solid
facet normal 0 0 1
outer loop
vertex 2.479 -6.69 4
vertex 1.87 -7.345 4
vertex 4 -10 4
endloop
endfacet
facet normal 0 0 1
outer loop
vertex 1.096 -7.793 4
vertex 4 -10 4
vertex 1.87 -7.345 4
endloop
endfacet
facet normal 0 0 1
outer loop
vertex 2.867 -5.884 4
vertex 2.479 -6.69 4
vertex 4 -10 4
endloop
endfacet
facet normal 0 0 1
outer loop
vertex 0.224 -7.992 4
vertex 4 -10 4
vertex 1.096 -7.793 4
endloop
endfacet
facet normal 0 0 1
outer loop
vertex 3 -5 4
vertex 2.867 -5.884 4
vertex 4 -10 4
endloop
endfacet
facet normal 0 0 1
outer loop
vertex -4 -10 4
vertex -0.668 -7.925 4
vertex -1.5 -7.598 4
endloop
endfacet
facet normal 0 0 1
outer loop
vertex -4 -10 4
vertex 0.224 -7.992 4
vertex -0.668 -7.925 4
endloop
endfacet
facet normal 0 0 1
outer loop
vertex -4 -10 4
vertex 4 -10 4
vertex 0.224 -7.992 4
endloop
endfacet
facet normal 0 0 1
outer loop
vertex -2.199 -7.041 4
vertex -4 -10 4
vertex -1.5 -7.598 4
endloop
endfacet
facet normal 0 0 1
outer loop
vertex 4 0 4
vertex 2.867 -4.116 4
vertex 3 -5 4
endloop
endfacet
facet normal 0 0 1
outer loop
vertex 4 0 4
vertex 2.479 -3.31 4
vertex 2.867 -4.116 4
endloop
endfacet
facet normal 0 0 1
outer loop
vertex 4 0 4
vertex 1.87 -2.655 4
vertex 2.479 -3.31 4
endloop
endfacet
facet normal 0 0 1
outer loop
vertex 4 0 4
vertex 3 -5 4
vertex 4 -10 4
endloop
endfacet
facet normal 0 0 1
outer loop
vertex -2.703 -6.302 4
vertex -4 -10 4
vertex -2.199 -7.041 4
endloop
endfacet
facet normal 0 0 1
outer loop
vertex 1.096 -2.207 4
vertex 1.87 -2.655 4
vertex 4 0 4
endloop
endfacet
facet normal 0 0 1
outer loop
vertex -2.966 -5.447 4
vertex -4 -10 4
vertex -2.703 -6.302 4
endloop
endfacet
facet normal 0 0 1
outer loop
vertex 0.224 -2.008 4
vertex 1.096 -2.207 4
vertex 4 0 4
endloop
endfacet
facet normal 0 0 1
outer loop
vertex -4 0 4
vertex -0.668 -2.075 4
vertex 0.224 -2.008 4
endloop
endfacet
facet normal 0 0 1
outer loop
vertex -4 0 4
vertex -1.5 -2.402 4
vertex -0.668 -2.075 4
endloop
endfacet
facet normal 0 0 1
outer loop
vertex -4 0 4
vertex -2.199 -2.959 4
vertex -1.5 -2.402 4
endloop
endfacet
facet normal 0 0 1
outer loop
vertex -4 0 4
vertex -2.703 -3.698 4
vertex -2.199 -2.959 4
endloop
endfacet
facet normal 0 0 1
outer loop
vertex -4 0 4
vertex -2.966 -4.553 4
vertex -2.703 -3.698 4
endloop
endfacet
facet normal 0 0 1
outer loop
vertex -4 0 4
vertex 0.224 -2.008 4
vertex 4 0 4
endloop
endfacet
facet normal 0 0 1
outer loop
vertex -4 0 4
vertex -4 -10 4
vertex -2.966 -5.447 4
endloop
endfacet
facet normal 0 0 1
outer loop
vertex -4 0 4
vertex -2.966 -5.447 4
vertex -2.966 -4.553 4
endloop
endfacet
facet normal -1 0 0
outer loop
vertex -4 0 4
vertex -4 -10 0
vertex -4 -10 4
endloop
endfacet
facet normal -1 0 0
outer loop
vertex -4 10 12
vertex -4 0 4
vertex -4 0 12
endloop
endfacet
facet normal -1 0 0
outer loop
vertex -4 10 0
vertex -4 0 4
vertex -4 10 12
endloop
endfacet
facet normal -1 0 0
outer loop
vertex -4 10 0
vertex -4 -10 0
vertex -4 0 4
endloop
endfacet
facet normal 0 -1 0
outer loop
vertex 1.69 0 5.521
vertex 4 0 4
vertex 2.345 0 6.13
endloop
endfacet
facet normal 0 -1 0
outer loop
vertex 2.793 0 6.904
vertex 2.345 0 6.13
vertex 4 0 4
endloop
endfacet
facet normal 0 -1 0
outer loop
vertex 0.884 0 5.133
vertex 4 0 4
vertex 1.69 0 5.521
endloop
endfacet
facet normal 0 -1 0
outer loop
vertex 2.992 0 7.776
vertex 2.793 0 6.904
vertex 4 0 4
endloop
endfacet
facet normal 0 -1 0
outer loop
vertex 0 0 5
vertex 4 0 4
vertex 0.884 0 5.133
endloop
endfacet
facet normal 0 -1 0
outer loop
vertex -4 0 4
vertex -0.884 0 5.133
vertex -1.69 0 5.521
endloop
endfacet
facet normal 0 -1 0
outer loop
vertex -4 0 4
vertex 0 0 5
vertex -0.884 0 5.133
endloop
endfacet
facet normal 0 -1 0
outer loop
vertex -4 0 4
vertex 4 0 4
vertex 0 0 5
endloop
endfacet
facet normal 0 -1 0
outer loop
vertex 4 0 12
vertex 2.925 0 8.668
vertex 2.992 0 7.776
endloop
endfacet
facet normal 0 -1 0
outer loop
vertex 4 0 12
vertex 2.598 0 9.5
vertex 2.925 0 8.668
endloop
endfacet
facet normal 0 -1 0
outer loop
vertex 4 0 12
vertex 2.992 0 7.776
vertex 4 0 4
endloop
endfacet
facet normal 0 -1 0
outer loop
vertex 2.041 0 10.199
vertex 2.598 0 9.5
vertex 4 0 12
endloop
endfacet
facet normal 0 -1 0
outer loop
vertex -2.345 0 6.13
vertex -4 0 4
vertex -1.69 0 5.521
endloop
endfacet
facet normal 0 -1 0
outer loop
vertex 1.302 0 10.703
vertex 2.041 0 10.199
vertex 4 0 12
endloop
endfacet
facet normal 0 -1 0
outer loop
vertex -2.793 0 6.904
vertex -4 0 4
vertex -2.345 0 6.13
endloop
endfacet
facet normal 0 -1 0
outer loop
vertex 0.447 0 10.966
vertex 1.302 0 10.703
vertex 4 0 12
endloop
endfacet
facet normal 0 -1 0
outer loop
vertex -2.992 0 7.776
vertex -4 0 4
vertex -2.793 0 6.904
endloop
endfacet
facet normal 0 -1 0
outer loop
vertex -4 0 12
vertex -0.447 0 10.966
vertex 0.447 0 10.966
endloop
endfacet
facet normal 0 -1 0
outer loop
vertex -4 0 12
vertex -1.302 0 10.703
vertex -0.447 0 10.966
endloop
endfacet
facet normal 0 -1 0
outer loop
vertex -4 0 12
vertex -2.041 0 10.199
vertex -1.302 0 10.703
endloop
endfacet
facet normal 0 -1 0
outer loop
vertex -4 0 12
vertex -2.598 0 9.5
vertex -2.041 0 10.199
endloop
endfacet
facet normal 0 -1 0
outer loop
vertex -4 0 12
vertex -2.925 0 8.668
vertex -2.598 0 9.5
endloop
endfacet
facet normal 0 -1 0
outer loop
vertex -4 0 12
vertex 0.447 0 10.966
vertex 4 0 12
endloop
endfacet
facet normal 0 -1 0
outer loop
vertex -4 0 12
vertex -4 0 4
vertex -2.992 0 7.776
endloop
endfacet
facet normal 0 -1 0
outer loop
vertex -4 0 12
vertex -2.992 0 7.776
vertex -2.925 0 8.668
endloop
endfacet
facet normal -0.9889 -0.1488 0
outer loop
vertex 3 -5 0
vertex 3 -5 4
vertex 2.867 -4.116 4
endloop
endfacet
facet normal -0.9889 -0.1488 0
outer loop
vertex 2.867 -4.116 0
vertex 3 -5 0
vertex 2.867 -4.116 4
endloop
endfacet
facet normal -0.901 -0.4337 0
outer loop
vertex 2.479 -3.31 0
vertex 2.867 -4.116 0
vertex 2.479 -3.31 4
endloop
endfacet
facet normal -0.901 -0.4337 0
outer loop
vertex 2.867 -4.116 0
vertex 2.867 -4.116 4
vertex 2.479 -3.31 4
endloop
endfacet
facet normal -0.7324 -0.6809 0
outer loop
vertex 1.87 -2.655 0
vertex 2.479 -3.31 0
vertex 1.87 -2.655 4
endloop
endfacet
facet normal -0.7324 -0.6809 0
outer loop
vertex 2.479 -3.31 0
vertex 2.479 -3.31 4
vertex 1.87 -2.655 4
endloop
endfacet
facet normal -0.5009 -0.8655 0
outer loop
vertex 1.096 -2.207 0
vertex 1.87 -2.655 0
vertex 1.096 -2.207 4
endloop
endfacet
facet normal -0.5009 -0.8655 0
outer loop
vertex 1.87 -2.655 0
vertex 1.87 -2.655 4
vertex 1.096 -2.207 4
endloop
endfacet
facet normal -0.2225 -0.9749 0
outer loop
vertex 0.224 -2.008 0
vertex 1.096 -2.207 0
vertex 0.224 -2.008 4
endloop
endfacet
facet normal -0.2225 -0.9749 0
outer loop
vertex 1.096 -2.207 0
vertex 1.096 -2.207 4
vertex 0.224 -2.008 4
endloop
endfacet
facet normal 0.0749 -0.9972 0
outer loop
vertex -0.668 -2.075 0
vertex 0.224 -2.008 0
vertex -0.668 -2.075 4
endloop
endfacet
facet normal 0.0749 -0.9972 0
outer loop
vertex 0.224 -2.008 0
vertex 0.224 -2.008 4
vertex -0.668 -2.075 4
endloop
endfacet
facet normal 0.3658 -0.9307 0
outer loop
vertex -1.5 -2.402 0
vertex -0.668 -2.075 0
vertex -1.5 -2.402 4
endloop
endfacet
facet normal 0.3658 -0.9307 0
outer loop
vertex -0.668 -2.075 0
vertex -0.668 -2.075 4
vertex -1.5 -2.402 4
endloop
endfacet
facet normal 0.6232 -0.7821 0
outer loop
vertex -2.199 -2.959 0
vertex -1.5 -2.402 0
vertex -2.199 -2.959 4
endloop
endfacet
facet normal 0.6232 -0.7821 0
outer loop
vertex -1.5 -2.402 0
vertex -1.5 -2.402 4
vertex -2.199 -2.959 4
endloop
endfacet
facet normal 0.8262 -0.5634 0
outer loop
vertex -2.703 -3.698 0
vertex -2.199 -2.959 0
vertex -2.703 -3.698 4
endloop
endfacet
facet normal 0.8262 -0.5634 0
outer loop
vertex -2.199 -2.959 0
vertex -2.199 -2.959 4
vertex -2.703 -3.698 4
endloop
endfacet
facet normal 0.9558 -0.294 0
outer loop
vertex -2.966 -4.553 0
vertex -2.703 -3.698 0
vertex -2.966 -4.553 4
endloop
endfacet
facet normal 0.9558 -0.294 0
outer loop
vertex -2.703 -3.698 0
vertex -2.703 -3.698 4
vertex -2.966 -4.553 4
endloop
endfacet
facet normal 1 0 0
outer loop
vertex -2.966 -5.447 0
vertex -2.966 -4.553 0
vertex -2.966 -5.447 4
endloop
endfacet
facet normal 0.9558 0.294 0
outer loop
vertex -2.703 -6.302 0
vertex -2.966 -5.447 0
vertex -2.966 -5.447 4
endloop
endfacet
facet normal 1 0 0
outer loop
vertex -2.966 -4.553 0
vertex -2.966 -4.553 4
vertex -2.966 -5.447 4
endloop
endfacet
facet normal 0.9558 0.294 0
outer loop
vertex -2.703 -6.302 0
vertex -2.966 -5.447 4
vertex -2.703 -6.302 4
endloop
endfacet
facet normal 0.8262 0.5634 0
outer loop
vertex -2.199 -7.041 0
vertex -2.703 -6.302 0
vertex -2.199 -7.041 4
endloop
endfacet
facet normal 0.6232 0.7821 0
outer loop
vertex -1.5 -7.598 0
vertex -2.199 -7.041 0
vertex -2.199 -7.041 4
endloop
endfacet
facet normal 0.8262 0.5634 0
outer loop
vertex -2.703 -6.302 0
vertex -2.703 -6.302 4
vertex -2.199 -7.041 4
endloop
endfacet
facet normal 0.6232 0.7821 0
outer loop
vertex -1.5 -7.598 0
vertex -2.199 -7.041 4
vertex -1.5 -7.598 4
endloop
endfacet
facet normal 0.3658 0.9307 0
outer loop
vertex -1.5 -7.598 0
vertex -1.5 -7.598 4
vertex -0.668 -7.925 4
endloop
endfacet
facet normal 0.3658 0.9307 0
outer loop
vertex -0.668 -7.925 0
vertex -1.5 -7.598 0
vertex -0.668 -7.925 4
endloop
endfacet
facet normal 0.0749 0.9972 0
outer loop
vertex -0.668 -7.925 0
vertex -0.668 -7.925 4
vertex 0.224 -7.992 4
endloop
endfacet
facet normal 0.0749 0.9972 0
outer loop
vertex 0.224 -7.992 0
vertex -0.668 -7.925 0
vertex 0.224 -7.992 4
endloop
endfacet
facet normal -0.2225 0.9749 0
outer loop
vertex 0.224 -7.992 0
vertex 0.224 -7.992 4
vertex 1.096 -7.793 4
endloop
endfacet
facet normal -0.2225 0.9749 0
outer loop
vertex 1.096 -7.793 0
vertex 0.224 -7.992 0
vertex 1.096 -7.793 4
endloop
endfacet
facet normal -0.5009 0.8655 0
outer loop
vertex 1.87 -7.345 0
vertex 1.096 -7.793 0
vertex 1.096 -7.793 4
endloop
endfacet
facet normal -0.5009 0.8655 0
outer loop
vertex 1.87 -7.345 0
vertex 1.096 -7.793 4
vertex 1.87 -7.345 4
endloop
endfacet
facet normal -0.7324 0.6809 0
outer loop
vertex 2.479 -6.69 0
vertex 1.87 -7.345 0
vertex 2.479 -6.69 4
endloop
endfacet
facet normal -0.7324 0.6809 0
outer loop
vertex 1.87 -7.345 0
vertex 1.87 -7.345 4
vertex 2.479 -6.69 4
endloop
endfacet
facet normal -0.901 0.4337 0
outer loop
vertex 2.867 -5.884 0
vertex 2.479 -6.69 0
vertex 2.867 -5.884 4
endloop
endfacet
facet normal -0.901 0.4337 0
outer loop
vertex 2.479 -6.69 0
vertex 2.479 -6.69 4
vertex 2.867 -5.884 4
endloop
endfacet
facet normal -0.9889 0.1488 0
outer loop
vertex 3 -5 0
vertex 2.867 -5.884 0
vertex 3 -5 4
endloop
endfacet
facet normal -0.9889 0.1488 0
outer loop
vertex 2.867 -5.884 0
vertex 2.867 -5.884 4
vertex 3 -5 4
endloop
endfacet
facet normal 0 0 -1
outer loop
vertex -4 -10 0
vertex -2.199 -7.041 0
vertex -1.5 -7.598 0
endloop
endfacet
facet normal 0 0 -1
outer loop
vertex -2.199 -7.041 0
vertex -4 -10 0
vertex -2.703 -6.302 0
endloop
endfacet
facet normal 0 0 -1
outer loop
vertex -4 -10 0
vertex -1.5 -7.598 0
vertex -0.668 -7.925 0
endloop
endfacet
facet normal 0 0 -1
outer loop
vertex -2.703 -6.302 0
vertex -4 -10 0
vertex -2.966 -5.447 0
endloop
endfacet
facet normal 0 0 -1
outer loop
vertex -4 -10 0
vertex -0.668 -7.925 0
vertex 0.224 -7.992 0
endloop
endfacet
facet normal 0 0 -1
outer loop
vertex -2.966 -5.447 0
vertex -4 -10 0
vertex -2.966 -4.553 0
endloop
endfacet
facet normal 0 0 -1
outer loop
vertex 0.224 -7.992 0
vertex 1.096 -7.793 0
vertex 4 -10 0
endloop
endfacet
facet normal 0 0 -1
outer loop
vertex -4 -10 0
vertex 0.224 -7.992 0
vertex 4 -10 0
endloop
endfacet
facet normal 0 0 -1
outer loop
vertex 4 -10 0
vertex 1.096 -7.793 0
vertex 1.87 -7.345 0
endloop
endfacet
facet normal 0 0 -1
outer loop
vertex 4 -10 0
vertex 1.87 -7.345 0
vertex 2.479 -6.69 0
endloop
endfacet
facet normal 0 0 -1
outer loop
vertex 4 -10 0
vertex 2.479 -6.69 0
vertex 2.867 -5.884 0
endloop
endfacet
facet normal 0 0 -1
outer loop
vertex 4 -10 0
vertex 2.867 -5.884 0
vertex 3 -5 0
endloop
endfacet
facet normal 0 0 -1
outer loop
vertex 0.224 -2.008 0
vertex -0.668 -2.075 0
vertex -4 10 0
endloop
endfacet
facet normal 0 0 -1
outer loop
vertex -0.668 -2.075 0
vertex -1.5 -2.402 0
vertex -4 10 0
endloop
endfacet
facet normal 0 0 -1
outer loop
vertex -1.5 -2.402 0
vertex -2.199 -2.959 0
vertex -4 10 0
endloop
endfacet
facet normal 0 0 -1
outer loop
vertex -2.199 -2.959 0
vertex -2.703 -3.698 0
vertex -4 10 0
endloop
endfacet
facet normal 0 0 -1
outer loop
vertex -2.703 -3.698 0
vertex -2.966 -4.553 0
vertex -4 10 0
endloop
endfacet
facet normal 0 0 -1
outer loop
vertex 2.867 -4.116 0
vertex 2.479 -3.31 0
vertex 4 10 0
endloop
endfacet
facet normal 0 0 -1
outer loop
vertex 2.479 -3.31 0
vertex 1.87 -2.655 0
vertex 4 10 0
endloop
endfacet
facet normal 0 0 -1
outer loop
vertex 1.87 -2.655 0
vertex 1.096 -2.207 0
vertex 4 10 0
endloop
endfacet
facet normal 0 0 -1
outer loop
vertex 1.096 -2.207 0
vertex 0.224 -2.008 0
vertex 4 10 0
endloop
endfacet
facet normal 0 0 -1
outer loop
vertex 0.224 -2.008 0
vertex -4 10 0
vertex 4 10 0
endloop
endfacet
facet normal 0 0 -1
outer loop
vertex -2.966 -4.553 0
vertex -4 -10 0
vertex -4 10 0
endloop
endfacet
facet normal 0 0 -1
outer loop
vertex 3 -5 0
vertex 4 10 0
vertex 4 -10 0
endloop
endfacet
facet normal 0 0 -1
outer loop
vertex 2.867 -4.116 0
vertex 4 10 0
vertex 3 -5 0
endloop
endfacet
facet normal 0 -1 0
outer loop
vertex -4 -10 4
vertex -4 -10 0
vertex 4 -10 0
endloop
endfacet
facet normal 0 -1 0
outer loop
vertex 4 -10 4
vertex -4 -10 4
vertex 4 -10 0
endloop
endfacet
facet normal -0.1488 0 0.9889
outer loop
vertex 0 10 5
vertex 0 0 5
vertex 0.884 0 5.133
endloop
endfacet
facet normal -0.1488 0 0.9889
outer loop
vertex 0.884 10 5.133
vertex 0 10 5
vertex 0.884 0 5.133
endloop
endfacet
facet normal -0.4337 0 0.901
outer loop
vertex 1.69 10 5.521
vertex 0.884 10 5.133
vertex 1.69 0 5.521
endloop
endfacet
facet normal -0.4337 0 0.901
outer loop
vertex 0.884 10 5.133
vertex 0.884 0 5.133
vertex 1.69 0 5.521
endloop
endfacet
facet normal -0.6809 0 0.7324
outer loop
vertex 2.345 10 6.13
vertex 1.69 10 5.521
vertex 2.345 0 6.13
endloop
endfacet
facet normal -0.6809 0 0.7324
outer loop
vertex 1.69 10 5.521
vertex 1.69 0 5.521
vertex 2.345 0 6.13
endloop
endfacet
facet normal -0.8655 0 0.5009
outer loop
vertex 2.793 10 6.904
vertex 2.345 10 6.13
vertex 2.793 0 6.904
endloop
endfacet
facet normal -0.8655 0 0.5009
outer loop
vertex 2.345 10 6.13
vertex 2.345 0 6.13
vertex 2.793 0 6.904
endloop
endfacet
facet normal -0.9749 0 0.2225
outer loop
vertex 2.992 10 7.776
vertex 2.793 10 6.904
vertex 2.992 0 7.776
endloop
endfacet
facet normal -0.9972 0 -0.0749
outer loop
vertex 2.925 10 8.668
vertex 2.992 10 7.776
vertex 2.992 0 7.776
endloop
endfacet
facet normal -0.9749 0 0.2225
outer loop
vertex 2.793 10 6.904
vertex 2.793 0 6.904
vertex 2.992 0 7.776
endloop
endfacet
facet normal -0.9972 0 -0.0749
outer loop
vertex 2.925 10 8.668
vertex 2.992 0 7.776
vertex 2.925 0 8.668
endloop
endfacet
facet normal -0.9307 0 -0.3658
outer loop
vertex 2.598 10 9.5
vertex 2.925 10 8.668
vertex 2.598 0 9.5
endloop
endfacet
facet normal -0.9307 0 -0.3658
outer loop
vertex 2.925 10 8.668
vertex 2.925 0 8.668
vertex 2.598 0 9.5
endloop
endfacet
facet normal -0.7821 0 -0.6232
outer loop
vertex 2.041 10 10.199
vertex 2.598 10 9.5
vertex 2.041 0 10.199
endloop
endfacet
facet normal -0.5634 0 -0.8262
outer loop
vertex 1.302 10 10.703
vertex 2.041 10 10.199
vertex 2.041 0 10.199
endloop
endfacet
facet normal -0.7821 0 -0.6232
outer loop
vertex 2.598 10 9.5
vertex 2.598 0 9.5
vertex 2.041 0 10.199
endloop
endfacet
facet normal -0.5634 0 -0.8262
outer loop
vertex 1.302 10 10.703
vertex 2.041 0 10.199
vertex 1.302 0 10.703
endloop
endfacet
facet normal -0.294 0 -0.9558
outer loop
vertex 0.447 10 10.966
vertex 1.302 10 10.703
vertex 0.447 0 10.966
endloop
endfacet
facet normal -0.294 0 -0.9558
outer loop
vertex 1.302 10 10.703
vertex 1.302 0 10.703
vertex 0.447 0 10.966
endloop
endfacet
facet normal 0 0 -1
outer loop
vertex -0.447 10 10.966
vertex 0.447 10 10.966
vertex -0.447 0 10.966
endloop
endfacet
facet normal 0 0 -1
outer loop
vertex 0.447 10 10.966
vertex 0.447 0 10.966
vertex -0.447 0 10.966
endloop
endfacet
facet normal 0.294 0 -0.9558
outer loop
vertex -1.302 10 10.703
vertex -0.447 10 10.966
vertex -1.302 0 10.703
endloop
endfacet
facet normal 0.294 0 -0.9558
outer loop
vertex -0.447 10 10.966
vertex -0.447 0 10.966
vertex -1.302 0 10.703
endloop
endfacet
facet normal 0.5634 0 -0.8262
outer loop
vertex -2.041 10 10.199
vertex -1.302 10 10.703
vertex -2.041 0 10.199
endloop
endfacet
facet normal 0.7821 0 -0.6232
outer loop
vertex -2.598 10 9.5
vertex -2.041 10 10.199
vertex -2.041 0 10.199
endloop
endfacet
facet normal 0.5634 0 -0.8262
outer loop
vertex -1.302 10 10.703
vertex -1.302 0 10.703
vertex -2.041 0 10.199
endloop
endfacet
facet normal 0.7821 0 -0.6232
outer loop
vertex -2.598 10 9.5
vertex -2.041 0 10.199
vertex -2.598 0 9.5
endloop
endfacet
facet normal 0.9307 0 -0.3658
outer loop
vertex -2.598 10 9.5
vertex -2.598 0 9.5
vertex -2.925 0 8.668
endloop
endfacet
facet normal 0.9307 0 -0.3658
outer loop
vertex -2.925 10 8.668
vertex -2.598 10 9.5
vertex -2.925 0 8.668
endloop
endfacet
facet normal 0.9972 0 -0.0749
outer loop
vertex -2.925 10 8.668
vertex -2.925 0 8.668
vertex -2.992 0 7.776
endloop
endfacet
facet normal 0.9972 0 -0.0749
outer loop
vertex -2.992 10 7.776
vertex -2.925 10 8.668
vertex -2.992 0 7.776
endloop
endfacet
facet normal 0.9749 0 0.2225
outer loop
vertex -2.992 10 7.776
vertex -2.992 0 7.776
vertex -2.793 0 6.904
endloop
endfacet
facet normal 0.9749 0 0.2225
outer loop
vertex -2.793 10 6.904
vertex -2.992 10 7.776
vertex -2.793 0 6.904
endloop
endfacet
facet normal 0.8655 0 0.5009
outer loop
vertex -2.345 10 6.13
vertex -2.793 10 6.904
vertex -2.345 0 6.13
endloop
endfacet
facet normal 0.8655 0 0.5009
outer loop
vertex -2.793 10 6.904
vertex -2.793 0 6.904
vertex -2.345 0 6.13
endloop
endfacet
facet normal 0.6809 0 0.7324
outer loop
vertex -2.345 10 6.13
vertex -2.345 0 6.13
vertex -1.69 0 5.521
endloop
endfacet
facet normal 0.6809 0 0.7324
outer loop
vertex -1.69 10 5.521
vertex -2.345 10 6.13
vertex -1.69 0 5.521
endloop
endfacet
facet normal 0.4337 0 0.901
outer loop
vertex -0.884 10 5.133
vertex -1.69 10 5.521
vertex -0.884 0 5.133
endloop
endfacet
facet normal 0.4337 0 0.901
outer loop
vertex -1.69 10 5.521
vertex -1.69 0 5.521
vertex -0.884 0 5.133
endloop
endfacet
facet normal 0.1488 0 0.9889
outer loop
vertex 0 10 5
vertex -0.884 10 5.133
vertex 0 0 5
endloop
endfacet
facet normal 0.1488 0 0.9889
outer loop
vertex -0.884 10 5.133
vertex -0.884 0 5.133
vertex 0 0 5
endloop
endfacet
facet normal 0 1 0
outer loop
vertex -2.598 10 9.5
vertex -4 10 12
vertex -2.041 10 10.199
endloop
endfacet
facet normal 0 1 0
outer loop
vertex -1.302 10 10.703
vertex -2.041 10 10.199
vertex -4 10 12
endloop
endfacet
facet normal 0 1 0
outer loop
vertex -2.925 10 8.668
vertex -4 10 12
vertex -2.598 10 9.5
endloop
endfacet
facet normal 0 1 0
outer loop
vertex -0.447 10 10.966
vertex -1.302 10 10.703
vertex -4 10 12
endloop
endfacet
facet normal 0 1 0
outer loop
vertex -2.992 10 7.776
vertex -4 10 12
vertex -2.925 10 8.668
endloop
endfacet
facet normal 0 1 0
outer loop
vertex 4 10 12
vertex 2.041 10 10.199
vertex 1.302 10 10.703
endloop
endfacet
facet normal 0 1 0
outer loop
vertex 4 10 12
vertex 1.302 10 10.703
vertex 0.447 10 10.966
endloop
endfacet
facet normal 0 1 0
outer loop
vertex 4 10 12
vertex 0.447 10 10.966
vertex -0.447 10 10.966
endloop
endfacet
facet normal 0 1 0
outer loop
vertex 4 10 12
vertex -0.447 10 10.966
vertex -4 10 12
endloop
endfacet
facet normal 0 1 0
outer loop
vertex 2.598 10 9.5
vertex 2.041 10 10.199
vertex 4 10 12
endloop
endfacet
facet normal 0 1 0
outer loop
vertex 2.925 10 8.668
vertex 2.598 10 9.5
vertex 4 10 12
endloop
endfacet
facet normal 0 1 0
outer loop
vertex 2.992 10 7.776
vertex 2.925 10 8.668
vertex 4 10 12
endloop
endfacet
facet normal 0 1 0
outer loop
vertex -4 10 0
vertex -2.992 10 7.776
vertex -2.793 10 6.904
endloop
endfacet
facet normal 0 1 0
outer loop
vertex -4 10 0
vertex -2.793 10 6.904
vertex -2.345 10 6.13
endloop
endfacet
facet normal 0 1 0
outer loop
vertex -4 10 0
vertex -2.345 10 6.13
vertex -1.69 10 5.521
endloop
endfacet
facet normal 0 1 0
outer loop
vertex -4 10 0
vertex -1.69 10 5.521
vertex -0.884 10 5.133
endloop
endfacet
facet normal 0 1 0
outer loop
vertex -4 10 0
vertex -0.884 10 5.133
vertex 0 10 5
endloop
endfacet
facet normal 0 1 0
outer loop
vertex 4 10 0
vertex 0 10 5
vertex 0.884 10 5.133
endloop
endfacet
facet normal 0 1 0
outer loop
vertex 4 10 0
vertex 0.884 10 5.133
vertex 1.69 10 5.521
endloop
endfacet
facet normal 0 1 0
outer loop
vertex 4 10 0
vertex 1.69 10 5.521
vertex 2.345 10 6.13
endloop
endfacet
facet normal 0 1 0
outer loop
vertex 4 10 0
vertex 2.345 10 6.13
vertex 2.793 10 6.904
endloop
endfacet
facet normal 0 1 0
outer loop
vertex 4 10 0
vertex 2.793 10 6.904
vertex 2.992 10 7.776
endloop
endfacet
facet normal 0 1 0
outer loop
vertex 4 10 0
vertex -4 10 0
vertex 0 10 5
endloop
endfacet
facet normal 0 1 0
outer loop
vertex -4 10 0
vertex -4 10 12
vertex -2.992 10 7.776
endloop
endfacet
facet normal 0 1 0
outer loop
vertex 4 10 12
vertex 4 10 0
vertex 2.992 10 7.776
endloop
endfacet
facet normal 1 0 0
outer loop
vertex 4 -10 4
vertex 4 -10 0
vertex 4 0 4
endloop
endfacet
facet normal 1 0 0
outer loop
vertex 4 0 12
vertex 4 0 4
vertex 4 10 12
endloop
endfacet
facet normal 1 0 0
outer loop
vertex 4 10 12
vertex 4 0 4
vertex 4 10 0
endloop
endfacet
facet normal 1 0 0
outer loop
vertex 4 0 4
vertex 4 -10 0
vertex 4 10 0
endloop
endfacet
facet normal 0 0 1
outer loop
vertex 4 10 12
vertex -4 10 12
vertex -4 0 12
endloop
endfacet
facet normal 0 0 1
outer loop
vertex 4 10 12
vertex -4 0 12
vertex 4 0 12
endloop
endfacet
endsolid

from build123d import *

# Parameters (mm, degrees)
ESQUISSE1_W             = 8
ESQUISSE1_H             = 20
BOSS_EXTRU_1_DEPTH      = 12
ESQUISSE2_W             = 8
ESQUISSE2_H             = 10
ENL_V_MAT_EXTRU_1_DEPTH = 8
ESQUISSE3_R             = 3
ENL_V_MAT_EXTRU_2_DEPTH = 10
ESQUISSE4_R             = 3
ENL_V_MAT_EXTRU_3_DEPTH = 4


with BuildPart() as part:
    # Esquisse1 → Boss.-Extru.1 (new body)
    with BuildSketch(Plane.XY):
        Rectangle(ESQUISSE1_W, ESQUISSE1_H)
    extrude(amount=BOSS_EXTRU_1_DEPTH)

    # Esquisse2 → Enlèv. mat.-Extru.1 (cut)
    with BuildSketch(Plane.ZY.offset(4)):
        with Locations((8, -5)):
            Rectangle(ESQUISSE2_W, ESQUISSE2_H)
    extrude(amount=-ENL_V_MAT_EXTRU_1_DEPTH, mode=Mode.SUBTRACT)

    # Esquisse3 → Enlèv. mat.-Extru.2 (cut)
    with BuildSketch(Plane.XZ):
        with Locations(Location((0, 8, 0), (0, 0, 270))):
            Circle(ESQUISSE3_R)
    extrude(amount=-ENL_V_MAT_EXTRU_2_DEPTH, mode=Mode.SUBTRACT)

    # Esquisse4 → Enlèv. mat.-Extru.3 (cut)
    with BuildSketch(Plane.XY.offset(4)):
        with Locations((0, -5)):
            Circle(ESQUISSE4_R)
    extrude(amount=-ENL_V_MAT_EXTRU_3_DEPTH, mode=Mode.SUBTRACT)


solid = part.part
